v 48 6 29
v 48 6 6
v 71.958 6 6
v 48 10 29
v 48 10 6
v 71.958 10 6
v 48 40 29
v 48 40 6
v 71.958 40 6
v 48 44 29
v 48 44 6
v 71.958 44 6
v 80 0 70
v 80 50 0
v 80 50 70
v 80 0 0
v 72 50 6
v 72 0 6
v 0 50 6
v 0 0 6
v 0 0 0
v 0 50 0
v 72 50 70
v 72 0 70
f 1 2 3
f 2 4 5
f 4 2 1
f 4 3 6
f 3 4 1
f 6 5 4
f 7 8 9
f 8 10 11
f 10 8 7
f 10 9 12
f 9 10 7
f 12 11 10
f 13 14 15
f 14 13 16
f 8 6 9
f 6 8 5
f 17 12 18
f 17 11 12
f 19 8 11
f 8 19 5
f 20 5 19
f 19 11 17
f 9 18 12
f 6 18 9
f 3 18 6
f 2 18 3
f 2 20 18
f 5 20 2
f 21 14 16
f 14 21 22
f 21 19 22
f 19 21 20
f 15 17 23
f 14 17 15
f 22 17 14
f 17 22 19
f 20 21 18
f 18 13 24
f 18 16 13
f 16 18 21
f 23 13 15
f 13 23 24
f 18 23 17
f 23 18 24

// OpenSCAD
$fn = 32;

// ----------------------------------------------------------------------
// Rib bracket: 2-gusset L bracket
// ----------------------------------------------------------------------

// --- parameters (mm) ---
base_l = 80;              // foot length, X
base_w = 50;              // foot width, Y
base_t = 6;               // foot thickness
plate_t = 8;              // upright plate thickness
plate_h = 70;             // overall height
gus_l = 24;               // gusset leg along the foot
gus_h = 24;               // gusset height
gus_t = 4;                // gusset thickness
gus_edge = 6;             // gusset margin from the foot edge
n_gus = 2;                // gusset count
fit_tol = 0.02;           // tolerance for press fits, mm
free_tol = 0.2;           // tolerance for clearance fits, mm

gus_pitch = (base_w - 2 * gus_edge - gus_t) / (n_gus - 1);  // gusset pitch

union() {
  cube([base_l, base_w, base_t]);
  translate([base_l - plate_t, 0, base_t - 1])
    cube([plate_t, base_w, plate_h - base_t + 1]);
  for (i = [0 : n_gus - 1])
    translate([base_l - plate_t - gus_l, gus_edge + i * gus_pitch, base_t - 1])
      rotate([-90, 0, 0])
        linear_extrude(height = gus_t)
          polygon(points = [[0, 0], [gus_l + 1, 0], [0, -gus_h]]);
}
